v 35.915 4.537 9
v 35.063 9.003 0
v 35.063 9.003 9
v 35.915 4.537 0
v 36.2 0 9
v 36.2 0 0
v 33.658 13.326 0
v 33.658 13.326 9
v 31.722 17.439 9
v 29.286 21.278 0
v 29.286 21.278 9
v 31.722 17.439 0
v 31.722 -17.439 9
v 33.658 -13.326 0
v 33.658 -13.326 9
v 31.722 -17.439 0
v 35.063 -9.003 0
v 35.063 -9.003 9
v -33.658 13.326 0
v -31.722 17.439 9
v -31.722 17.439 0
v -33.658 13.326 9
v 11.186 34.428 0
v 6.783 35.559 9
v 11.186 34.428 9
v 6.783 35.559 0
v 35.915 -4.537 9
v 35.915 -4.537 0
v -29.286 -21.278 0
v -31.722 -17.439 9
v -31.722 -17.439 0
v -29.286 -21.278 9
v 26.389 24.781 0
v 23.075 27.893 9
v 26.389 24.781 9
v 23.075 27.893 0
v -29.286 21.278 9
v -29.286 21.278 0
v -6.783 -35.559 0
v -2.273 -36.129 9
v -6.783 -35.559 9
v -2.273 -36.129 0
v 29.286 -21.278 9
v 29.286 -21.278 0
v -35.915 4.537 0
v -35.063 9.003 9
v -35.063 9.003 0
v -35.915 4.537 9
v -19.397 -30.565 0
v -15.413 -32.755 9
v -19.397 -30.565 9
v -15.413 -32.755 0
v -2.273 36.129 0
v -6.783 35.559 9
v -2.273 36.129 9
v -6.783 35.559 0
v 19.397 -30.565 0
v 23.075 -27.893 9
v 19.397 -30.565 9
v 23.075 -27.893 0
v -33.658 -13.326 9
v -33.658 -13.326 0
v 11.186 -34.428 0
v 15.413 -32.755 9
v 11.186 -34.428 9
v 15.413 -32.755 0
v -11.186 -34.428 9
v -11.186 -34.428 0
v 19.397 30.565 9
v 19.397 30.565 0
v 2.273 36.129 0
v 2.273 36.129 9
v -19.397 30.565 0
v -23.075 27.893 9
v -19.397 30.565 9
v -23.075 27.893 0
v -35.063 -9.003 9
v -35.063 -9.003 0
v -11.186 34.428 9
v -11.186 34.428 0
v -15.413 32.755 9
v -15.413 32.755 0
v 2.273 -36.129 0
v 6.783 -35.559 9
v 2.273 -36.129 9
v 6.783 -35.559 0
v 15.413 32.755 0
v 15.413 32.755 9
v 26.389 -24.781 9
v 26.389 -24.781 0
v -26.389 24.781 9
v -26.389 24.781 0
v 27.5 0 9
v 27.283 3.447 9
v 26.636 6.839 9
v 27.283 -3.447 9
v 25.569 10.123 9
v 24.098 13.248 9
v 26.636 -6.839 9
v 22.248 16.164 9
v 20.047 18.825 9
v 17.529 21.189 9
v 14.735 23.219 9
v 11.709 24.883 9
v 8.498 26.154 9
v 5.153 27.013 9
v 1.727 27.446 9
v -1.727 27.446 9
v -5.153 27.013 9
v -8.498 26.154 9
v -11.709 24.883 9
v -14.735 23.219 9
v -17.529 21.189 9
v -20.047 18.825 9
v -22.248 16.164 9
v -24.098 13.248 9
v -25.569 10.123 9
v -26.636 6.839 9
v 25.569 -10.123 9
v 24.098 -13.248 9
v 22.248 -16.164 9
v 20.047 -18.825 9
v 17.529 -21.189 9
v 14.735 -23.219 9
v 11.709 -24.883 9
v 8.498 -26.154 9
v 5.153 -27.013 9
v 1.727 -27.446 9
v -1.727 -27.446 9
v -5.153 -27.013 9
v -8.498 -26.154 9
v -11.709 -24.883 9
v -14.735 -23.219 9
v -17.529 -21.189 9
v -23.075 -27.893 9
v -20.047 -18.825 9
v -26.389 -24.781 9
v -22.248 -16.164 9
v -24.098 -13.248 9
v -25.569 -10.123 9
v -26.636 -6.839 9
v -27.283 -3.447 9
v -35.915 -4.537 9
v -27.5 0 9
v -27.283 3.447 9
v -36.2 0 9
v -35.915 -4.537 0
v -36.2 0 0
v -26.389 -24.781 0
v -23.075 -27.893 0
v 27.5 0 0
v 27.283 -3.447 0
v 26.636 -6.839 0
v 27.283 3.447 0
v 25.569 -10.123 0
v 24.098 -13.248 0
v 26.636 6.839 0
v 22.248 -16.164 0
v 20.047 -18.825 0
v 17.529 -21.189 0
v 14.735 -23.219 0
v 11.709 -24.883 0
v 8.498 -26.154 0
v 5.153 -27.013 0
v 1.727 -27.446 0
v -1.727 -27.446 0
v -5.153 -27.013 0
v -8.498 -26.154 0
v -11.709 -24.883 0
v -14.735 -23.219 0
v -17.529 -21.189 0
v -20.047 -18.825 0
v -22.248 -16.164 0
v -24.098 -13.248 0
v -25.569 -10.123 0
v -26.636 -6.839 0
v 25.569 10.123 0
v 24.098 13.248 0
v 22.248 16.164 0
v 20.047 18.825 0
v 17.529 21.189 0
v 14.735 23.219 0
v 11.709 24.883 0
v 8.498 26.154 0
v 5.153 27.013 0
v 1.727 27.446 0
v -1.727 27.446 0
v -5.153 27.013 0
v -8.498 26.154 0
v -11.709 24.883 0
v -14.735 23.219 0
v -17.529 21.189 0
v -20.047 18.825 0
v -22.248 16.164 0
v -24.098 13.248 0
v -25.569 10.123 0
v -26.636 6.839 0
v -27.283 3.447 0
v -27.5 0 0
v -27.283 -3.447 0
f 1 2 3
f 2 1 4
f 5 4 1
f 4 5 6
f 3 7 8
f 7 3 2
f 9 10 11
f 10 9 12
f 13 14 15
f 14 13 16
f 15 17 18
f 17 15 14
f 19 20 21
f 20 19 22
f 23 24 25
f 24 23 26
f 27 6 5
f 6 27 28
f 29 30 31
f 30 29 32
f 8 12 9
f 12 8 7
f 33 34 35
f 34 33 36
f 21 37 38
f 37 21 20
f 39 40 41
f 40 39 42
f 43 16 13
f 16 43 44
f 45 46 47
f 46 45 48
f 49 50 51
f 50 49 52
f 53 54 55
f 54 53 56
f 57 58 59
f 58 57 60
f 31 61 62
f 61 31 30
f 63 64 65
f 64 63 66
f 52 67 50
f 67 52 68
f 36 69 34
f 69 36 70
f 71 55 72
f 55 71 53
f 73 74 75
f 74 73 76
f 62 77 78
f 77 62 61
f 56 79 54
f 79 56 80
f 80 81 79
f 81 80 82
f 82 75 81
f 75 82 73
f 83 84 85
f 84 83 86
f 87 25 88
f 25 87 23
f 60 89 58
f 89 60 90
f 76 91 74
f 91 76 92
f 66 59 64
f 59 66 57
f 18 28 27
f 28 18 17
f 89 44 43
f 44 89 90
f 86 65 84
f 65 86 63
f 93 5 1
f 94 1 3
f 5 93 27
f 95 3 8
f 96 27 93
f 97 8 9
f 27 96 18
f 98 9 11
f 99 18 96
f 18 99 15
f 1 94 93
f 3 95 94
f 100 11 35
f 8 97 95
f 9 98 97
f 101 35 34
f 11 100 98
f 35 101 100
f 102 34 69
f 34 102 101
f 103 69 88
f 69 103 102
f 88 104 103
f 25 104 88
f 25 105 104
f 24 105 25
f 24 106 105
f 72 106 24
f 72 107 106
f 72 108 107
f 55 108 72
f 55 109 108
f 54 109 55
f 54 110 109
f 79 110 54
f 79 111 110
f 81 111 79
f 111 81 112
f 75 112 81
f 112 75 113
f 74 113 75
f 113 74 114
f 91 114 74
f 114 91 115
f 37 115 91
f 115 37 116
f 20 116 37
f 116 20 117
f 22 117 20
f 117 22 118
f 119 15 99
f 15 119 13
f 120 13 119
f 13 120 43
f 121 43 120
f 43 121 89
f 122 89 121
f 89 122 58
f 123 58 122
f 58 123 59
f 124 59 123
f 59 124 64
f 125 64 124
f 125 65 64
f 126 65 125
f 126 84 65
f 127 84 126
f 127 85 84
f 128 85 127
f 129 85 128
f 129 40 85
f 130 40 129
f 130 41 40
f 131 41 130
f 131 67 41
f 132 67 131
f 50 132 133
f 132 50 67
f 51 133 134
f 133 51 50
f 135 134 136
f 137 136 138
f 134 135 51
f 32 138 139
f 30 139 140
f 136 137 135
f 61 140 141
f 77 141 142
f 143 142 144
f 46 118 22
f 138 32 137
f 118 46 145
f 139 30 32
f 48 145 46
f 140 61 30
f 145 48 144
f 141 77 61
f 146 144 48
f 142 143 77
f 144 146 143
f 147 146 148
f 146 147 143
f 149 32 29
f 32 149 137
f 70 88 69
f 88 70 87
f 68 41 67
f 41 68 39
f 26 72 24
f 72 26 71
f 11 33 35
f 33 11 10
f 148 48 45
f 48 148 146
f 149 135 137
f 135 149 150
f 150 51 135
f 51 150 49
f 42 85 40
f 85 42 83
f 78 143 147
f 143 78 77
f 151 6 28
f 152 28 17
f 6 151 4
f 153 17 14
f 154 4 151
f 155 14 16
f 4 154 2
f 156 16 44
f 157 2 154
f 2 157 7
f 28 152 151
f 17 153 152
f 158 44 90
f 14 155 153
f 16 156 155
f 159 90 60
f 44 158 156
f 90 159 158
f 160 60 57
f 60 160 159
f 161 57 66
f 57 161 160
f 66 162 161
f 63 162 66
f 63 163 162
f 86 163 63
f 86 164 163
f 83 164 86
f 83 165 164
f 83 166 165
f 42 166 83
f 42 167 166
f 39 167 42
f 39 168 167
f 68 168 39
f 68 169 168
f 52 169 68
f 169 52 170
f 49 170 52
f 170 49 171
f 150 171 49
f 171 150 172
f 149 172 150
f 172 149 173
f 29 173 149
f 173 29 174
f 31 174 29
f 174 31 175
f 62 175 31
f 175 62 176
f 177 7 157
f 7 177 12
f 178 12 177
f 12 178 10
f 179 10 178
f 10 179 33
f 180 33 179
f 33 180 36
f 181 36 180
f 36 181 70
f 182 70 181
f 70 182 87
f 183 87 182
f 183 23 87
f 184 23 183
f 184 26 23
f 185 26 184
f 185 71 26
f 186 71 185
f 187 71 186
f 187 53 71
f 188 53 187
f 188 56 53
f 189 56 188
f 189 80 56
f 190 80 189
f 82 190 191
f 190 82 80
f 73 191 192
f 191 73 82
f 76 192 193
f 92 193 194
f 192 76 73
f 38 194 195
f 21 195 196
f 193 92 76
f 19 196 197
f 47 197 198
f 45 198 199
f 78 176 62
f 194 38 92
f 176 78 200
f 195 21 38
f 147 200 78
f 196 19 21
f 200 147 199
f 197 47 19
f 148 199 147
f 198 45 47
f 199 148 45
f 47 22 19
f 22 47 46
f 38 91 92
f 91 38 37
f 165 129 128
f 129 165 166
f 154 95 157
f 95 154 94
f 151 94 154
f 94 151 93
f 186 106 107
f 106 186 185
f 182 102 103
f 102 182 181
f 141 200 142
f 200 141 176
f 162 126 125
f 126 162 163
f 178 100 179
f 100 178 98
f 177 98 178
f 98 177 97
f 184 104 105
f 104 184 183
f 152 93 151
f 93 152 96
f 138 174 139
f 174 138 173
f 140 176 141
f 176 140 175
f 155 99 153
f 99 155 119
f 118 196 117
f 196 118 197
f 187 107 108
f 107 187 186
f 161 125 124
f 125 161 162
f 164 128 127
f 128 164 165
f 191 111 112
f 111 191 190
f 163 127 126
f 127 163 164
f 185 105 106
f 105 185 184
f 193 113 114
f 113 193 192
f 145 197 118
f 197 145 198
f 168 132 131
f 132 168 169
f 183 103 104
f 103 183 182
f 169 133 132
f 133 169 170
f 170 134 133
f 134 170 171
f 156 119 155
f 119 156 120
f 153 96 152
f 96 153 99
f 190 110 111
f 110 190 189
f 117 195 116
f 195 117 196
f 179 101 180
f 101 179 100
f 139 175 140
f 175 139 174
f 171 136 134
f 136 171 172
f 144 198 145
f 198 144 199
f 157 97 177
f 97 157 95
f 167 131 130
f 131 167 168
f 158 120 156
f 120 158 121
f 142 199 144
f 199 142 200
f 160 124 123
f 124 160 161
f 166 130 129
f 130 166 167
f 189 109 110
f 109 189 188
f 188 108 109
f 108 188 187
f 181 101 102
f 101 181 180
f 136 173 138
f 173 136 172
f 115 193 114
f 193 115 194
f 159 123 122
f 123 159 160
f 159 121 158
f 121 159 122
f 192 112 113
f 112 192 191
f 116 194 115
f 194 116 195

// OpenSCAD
$fn = 50;


difference() {
	union() {
		cylinder(h = 9, r = 36.2000000000);
	}
	union() {
		cylinder(h = 9, r = 27.5000000000);
	}
}
